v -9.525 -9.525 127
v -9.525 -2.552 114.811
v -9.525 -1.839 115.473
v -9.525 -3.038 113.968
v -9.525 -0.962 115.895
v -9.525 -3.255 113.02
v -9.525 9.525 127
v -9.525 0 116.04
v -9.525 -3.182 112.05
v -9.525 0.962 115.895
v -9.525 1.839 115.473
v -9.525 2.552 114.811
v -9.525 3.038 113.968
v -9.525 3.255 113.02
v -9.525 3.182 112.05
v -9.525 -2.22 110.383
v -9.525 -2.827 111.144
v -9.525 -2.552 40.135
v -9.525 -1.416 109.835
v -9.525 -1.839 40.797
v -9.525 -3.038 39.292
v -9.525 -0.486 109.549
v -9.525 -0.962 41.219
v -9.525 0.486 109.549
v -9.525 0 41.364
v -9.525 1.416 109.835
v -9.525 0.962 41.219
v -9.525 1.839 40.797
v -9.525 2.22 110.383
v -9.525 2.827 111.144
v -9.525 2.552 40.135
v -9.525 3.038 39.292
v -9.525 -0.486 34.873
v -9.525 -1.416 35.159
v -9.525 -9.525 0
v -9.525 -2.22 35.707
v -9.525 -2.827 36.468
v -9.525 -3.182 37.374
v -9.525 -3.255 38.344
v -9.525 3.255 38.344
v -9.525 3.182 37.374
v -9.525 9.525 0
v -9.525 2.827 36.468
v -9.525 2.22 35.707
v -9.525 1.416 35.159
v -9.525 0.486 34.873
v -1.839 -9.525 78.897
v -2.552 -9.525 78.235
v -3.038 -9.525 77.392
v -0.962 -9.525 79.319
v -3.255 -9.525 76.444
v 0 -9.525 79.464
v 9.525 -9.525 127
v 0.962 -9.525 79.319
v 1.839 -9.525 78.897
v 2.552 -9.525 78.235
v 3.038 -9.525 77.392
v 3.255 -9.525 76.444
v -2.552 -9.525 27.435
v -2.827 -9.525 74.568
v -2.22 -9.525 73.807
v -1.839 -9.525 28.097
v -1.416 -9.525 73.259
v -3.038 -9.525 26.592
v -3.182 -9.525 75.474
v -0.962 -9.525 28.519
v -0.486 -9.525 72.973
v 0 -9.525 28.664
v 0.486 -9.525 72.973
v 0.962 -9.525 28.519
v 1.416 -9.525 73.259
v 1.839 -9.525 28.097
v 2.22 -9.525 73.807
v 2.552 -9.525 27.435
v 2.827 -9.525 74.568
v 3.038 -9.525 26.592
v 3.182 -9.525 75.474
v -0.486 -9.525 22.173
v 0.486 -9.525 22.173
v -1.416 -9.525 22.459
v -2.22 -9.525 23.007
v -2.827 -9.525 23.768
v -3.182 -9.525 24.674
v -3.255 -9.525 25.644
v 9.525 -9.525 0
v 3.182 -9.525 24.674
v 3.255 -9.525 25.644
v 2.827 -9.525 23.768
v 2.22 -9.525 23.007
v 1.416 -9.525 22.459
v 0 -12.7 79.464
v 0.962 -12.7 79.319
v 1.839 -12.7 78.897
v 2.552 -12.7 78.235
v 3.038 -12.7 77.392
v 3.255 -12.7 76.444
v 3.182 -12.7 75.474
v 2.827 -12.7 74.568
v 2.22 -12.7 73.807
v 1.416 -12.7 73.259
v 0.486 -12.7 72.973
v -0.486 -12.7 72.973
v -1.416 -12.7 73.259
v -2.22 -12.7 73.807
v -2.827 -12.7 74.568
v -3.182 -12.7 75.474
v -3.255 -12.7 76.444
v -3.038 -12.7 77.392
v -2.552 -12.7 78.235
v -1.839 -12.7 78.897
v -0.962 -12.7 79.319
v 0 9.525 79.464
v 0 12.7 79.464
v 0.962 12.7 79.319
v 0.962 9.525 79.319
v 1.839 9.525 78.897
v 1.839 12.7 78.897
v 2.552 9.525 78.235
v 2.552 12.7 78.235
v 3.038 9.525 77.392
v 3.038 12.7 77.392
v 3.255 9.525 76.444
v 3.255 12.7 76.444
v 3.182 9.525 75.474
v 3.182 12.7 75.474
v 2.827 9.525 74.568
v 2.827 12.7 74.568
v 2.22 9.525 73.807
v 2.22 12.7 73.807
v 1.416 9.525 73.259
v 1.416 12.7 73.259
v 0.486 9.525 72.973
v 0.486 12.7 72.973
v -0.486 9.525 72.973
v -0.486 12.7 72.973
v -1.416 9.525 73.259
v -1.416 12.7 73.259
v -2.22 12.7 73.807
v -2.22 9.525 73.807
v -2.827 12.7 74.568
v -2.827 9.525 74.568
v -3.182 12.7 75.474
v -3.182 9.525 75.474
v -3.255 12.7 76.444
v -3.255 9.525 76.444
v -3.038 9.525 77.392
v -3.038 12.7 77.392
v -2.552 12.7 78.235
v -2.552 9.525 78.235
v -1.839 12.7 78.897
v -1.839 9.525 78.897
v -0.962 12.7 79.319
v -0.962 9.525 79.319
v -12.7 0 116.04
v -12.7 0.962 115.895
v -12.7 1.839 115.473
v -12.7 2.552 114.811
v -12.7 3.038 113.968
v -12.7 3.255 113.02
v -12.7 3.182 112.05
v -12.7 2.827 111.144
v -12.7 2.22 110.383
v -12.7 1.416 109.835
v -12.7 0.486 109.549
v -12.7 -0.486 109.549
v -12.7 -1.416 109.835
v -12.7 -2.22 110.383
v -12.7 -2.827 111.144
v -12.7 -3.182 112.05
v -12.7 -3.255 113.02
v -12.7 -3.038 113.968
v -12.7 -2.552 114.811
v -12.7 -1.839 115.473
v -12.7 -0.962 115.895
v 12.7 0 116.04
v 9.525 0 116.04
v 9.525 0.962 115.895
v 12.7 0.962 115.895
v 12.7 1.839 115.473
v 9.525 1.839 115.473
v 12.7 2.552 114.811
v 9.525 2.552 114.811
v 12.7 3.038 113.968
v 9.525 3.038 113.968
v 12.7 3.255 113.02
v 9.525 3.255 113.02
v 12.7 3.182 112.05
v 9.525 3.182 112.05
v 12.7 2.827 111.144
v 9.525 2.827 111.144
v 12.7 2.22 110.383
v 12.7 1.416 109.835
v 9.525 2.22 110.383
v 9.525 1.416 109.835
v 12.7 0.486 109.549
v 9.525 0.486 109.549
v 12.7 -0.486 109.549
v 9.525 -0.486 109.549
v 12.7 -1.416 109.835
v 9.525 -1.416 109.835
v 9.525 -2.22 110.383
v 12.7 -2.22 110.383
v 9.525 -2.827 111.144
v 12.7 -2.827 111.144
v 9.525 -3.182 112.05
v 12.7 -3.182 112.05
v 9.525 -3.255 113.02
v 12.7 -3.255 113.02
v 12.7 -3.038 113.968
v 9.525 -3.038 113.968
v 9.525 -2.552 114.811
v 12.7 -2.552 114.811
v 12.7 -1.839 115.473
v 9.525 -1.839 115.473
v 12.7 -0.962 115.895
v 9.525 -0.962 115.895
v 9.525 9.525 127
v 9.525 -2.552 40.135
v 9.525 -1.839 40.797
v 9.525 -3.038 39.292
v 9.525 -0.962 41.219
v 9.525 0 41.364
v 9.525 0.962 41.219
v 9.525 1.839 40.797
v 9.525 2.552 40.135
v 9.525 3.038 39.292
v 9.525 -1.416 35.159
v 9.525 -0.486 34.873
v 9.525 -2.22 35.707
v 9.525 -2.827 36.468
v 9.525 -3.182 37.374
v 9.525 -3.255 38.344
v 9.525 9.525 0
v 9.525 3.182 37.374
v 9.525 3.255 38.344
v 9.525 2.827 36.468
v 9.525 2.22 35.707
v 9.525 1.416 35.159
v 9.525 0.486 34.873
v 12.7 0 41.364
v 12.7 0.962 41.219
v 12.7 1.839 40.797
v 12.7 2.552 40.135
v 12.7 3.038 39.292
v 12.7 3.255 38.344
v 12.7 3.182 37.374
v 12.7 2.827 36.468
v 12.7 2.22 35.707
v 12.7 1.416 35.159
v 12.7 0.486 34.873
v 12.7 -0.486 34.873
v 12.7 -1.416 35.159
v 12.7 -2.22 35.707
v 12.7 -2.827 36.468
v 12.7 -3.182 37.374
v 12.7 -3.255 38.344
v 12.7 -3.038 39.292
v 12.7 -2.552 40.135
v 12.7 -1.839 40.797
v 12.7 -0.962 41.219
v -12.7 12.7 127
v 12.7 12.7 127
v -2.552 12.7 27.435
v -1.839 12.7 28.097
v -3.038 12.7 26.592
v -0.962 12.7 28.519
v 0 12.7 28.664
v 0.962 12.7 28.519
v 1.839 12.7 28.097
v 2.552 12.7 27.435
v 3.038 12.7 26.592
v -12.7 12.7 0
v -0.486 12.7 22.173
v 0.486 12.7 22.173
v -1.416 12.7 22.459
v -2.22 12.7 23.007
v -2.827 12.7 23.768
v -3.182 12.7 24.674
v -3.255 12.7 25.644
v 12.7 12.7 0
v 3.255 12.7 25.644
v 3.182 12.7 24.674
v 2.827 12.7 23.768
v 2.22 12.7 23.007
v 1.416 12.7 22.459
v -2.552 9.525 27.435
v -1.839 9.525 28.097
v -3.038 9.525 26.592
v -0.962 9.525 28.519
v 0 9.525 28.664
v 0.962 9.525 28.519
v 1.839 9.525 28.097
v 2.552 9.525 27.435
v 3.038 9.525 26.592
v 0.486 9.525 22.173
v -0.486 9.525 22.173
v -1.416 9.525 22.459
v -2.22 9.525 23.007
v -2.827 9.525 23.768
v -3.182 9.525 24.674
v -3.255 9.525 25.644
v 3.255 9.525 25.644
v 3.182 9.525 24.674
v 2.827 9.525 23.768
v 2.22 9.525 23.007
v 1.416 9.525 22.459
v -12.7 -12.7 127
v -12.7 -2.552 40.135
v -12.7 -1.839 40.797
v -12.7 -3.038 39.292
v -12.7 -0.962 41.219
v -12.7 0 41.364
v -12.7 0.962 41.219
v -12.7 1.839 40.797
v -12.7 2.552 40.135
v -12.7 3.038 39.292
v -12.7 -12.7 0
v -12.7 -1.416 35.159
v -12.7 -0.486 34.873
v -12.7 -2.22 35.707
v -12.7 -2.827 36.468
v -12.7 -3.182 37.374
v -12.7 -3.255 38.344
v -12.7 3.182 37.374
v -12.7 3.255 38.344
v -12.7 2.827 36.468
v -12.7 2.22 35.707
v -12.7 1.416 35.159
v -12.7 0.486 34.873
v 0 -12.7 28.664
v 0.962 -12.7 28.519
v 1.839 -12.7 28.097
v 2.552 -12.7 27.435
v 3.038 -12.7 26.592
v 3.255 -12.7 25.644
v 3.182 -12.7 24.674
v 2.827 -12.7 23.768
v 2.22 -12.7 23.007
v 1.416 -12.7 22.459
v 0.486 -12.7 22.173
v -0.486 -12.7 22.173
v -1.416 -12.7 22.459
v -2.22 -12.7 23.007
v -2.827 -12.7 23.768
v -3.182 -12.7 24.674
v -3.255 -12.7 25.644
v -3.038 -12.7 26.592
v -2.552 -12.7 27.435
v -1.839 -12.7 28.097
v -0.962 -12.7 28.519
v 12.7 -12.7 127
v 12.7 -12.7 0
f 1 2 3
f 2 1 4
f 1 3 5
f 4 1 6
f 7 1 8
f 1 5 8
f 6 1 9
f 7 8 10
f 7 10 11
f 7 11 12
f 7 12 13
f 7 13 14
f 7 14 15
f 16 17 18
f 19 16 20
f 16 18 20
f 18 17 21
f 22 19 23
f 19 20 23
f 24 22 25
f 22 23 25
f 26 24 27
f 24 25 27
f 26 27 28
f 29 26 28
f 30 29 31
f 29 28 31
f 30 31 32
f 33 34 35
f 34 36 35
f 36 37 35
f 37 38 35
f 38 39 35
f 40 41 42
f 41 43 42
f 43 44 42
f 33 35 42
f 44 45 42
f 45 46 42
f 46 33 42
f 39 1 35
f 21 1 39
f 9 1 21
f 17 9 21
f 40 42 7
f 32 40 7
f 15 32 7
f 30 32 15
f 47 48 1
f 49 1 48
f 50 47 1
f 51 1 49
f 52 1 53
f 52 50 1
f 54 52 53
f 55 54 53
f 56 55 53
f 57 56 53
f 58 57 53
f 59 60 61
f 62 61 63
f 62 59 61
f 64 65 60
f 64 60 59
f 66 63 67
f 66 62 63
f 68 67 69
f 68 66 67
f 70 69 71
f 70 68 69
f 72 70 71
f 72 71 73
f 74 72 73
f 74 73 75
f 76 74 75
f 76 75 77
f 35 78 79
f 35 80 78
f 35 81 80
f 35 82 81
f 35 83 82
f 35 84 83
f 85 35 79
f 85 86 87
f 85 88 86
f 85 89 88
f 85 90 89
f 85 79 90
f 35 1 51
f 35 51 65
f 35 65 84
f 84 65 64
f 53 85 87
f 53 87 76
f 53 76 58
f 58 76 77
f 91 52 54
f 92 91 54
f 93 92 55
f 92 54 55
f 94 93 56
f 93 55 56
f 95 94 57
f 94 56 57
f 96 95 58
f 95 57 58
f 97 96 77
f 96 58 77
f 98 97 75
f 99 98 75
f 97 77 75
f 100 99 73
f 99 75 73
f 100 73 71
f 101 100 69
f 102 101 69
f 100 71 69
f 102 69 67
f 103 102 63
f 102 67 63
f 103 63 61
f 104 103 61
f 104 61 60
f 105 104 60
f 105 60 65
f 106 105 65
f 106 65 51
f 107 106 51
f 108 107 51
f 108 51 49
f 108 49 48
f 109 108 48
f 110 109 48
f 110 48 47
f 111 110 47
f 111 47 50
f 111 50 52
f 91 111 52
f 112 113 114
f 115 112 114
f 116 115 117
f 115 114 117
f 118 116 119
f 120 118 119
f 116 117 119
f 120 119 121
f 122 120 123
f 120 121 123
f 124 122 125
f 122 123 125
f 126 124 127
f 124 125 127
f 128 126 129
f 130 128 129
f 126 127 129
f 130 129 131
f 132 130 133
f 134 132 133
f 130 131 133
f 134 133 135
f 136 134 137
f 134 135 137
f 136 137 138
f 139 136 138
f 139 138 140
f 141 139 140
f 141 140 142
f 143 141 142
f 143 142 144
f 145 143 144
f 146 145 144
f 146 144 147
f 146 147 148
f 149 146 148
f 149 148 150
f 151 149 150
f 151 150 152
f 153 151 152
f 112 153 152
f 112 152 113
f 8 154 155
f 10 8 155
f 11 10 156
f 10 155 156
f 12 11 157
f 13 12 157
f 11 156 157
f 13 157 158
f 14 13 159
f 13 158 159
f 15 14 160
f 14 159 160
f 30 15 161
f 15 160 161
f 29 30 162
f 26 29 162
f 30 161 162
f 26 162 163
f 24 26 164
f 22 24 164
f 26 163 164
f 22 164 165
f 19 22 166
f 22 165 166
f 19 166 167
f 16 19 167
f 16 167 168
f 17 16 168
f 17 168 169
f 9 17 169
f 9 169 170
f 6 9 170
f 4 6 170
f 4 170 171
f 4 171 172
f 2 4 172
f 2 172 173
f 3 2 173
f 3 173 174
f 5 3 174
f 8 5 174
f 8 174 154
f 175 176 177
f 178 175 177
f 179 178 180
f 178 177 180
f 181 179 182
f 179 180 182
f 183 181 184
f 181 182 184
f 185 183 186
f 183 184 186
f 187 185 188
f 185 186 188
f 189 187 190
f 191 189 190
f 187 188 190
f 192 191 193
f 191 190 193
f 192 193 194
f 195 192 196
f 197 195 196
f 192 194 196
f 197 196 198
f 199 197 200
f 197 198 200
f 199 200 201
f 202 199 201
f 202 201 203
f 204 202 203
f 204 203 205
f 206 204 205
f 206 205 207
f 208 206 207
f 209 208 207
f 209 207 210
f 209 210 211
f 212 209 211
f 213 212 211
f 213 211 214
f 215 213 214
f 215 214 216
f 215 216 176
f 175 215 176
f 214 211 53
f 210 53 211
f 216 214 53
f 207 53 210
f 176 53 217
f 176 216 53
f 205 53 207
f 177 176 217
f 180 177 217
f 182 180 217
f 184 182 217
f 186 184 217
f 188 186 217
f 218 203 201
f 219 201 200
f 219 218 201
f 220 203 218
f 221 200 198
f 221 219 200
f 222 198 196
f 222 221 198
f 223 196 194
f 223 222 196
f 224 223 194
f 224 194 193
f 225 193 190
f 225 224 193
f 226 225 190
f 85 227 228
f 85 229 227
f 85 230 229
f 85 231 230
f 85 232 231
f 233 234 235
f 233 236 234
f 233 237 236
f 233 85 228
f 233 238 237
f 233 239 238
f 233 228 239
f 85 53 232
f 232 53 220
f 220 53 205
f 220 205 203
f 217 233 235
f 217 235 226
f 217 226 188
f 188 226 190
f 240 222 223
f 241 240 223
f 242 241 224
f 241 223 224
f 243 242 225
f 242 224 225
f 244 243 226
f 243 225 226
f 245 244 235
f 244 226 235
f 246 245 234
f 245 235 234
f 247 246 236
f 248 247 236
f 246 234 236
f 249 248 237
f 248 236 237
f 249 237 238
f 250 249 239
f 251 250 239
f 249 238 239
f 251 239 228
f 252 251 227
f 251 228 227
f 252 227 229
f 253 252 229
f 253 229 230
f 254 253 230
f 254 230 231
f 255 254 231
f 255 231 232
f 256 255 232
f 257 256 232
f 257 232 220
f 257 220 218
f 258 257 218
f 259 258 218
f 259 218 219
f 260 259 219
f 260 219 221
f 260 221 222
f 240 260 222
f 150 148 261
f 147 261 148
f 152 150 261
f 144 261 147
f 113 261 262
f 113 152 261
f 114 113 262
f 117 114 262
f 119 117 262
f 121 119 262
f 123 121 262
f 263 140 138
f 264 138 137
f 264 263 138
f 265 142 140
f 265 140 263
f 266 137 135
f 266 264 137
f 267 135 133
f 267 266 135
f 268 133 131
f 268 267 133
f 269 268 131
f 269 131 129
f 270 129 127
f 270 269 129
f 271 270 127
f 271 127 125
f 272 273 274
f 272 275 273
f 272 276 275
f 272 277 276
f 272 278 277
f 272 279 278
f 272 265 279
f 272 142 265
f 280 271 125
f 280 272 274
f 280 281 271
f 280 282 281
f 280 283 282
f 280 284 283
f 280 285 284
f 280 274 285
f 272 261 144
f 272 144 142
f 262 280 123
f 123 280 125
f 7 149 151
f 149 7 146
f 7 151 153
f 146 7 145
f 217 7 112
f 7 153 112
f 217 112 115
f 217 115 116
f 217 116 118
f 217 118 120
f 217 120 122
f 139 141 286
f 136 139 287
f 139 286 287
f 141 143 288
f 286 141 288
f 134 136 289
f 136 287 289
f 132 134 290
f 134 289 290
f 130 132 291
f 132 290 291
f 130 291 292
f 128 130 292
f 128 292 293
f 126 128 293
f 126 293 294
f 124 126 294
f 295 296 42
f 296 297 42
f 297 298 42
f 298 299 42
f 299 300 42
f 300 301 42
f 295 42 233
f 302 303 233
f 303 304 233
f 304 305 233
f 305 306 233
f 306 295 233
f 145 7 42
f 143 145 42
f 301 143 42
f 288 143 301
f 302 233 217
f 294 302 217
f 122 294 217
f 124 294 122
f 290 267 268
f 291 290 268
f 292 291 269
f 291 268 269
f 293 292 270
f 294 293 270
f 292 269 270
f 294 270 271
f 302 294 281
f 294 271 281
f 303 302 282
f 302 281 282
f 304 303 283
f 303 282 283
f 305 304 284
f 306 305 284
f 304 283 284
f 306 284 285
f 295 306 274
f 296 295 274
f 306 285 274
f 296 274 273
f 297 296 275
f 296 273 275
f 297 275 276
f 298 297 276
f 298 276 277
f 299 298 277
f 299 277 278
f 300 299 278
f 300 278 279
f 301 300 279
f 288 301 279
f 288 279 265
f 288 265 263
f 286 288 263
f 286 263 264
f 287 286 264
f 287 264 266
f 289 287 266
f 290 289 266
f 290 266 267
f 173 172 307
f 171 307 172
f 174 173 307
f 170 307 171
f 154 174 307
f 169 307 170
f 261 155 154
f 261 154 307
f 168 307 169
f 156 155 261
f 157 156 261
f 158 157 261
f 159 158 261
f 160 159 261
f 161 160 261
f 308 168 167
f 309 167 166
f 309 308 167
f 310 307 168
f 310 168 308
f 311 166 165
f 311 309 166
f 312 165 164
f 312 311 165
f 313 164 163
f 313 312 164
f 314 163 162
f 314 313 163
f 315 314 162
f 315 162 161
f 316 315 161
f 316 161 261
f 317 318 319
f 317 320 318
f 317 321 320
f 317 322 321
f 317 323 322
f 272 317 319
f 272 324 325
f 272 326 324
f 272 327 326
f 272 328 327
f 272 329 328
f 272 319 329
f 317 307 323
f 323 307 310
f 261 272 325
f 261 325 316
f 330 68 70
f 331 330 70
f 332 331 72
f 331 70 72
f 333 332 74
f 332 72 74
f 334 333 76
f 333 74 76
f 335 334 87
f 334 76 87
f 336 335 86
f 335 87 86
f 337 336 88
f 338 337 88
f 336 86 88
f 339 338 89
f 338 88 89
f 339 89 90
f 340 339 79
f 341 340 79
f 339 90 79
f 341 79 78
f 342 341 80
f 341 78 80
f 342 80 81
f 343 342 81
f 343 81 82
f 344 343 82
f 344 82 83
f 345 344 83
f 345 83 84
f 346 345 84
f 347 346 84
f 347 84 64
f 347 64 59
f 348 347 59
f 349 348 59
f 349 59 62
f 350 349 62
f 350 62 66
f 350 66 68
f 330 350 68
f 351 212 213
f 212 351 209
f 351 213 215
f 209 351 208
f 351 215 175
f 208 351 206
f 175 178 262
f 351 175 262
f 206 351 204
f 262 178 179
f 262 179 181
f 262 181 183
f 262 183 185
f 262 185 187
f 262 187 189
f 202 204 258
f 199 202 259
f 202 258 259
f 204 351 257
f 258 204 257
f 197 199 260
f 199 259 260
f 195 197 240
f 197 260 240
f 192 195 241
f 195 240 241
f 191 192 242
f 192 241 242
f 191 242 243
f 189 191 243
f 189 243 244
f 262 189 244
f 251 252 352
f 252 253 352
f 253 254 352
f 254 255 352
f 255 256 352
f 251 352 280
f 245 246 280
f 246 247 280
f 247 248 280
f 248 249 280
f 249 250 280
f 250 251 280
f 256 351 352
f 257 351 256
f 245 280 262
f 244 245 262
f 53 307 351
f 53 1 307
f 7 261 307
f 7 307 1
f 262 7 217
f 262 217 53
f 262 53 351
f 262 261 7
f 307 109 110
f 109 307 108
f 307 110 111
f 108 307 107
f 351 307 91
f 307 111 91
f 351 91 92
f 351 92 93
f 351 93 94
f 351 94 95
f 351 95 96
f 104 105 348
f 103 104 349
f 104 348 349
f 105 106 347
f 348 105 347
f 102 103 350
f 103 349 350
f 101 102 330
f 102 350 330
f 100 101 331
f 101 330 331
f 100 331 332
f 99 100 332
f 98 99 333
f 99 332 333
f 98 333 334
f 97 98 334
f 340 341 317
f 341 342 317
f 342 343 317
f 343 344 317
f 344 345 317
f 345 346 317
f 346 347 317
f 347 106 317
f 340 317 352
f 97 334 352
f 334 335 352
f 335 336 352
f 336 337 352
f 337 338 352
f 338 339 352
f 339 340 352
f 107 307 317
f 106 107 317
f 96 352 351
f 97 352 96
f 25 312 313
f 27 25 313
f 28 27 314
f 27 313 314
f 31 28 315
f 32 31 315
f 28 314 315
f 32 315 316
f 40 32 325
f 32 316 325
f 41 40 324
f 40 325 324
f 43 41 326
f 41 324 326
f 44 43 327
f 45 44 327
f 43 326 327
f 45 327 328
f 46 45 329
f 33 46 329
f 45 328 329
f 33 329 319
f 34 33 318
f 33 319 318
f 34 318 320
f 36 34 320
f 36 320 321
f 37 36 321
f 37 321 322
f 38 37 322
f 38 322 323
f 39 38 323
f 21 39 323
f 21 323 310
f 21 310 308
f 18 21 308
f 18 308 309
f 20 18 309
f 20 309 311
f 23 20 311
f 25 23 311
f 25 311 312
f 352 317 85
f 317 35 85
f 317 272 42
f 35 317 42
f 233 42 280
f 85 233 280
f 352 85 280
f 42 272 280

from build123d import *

# Parameters (mm, degrees)
SKETCH2_W           = 25.4
SKETCH2_H           = 25.4
BOSS_EXTRUDE1_DEPTH = 127
SKETCH4_W           = 19.05
SKETCH4_H           = 19.05
CUT_EXTRUDE1_DEPTH  = 129.263712717
SKETCH5_R           = 3.2639
CUT_EXTRUDE2_DEPTH  = 304.8
SKETCH6_R           = 3.2639
CUT_EXTRUDE3_DEPTH  = 131.136274728
SKETCH7_R           = 3.2639
CUT_EXTRUDE4_DEPTH  = 131.136274728


with BuildPart() as part:
    # Sketch2 → Boss-Extrude1 (new body)
    with BuildSketch(Plane.XY):
        Rectangle(SKETCH2_W, SKETCH2_H)
    extrude(amount=BOSS_EXTRUDE1_DEPTH)

    # Sketch4 → Cut-Extrude1 (cut, through all)
    with BuildSketch(Plane.XY):
        Rectangle(SKETCH4_W, SKETCH4_H)
    extrude(amount=CUT_EXTRUDE1_DEPTH, mode=Mode.SUBTRACT)

    # Sketch5 → Cut-Extrude2 (cut)
    with BuildSketch(Plane(origin=(0, 12.7, 0), x_dir=(1, 0, 0), z_dir=(0, 1, 0))):
        with Locations(Location((0, -25.4, 0), (0, 0, 270))):
            Circle(SKETCH5_R)
    extrude(amount=-CUT_EXTRUDE2_DEPTH, mode=Mode.SUBTRACT)

    # Sketch6 → Cut-Extrude3 (cut, through all)
    with BuildSketch(Plane(origin=(0, 12.7, 0), x_dir=(1, 0, 0), z_dir=(0, 1, 0))):
        with Locations(Location((0, -76.2, 0), (0, 0, 270))):
            Circle(SKETCH6_R)
    extrude(amount=-CUT_EXTRUDE3_DEPTH, mode=Mode.SUBTRACT)

    # Sketch7 → Cut-Extrude4 (cut, through all)
    with BuildSketch(Plane.ZY.offset(12.7)):
        with Locations((38.1, 0)):
            Circle(SKETCH7_R)
        with Locations((112.776, 0)):
            Circle(SKETCH7_R)
    extrude(amount=-CUT_EXTRUDE4_DEPTH, mode=Mode.SUBTRACT)


solid = part.part
